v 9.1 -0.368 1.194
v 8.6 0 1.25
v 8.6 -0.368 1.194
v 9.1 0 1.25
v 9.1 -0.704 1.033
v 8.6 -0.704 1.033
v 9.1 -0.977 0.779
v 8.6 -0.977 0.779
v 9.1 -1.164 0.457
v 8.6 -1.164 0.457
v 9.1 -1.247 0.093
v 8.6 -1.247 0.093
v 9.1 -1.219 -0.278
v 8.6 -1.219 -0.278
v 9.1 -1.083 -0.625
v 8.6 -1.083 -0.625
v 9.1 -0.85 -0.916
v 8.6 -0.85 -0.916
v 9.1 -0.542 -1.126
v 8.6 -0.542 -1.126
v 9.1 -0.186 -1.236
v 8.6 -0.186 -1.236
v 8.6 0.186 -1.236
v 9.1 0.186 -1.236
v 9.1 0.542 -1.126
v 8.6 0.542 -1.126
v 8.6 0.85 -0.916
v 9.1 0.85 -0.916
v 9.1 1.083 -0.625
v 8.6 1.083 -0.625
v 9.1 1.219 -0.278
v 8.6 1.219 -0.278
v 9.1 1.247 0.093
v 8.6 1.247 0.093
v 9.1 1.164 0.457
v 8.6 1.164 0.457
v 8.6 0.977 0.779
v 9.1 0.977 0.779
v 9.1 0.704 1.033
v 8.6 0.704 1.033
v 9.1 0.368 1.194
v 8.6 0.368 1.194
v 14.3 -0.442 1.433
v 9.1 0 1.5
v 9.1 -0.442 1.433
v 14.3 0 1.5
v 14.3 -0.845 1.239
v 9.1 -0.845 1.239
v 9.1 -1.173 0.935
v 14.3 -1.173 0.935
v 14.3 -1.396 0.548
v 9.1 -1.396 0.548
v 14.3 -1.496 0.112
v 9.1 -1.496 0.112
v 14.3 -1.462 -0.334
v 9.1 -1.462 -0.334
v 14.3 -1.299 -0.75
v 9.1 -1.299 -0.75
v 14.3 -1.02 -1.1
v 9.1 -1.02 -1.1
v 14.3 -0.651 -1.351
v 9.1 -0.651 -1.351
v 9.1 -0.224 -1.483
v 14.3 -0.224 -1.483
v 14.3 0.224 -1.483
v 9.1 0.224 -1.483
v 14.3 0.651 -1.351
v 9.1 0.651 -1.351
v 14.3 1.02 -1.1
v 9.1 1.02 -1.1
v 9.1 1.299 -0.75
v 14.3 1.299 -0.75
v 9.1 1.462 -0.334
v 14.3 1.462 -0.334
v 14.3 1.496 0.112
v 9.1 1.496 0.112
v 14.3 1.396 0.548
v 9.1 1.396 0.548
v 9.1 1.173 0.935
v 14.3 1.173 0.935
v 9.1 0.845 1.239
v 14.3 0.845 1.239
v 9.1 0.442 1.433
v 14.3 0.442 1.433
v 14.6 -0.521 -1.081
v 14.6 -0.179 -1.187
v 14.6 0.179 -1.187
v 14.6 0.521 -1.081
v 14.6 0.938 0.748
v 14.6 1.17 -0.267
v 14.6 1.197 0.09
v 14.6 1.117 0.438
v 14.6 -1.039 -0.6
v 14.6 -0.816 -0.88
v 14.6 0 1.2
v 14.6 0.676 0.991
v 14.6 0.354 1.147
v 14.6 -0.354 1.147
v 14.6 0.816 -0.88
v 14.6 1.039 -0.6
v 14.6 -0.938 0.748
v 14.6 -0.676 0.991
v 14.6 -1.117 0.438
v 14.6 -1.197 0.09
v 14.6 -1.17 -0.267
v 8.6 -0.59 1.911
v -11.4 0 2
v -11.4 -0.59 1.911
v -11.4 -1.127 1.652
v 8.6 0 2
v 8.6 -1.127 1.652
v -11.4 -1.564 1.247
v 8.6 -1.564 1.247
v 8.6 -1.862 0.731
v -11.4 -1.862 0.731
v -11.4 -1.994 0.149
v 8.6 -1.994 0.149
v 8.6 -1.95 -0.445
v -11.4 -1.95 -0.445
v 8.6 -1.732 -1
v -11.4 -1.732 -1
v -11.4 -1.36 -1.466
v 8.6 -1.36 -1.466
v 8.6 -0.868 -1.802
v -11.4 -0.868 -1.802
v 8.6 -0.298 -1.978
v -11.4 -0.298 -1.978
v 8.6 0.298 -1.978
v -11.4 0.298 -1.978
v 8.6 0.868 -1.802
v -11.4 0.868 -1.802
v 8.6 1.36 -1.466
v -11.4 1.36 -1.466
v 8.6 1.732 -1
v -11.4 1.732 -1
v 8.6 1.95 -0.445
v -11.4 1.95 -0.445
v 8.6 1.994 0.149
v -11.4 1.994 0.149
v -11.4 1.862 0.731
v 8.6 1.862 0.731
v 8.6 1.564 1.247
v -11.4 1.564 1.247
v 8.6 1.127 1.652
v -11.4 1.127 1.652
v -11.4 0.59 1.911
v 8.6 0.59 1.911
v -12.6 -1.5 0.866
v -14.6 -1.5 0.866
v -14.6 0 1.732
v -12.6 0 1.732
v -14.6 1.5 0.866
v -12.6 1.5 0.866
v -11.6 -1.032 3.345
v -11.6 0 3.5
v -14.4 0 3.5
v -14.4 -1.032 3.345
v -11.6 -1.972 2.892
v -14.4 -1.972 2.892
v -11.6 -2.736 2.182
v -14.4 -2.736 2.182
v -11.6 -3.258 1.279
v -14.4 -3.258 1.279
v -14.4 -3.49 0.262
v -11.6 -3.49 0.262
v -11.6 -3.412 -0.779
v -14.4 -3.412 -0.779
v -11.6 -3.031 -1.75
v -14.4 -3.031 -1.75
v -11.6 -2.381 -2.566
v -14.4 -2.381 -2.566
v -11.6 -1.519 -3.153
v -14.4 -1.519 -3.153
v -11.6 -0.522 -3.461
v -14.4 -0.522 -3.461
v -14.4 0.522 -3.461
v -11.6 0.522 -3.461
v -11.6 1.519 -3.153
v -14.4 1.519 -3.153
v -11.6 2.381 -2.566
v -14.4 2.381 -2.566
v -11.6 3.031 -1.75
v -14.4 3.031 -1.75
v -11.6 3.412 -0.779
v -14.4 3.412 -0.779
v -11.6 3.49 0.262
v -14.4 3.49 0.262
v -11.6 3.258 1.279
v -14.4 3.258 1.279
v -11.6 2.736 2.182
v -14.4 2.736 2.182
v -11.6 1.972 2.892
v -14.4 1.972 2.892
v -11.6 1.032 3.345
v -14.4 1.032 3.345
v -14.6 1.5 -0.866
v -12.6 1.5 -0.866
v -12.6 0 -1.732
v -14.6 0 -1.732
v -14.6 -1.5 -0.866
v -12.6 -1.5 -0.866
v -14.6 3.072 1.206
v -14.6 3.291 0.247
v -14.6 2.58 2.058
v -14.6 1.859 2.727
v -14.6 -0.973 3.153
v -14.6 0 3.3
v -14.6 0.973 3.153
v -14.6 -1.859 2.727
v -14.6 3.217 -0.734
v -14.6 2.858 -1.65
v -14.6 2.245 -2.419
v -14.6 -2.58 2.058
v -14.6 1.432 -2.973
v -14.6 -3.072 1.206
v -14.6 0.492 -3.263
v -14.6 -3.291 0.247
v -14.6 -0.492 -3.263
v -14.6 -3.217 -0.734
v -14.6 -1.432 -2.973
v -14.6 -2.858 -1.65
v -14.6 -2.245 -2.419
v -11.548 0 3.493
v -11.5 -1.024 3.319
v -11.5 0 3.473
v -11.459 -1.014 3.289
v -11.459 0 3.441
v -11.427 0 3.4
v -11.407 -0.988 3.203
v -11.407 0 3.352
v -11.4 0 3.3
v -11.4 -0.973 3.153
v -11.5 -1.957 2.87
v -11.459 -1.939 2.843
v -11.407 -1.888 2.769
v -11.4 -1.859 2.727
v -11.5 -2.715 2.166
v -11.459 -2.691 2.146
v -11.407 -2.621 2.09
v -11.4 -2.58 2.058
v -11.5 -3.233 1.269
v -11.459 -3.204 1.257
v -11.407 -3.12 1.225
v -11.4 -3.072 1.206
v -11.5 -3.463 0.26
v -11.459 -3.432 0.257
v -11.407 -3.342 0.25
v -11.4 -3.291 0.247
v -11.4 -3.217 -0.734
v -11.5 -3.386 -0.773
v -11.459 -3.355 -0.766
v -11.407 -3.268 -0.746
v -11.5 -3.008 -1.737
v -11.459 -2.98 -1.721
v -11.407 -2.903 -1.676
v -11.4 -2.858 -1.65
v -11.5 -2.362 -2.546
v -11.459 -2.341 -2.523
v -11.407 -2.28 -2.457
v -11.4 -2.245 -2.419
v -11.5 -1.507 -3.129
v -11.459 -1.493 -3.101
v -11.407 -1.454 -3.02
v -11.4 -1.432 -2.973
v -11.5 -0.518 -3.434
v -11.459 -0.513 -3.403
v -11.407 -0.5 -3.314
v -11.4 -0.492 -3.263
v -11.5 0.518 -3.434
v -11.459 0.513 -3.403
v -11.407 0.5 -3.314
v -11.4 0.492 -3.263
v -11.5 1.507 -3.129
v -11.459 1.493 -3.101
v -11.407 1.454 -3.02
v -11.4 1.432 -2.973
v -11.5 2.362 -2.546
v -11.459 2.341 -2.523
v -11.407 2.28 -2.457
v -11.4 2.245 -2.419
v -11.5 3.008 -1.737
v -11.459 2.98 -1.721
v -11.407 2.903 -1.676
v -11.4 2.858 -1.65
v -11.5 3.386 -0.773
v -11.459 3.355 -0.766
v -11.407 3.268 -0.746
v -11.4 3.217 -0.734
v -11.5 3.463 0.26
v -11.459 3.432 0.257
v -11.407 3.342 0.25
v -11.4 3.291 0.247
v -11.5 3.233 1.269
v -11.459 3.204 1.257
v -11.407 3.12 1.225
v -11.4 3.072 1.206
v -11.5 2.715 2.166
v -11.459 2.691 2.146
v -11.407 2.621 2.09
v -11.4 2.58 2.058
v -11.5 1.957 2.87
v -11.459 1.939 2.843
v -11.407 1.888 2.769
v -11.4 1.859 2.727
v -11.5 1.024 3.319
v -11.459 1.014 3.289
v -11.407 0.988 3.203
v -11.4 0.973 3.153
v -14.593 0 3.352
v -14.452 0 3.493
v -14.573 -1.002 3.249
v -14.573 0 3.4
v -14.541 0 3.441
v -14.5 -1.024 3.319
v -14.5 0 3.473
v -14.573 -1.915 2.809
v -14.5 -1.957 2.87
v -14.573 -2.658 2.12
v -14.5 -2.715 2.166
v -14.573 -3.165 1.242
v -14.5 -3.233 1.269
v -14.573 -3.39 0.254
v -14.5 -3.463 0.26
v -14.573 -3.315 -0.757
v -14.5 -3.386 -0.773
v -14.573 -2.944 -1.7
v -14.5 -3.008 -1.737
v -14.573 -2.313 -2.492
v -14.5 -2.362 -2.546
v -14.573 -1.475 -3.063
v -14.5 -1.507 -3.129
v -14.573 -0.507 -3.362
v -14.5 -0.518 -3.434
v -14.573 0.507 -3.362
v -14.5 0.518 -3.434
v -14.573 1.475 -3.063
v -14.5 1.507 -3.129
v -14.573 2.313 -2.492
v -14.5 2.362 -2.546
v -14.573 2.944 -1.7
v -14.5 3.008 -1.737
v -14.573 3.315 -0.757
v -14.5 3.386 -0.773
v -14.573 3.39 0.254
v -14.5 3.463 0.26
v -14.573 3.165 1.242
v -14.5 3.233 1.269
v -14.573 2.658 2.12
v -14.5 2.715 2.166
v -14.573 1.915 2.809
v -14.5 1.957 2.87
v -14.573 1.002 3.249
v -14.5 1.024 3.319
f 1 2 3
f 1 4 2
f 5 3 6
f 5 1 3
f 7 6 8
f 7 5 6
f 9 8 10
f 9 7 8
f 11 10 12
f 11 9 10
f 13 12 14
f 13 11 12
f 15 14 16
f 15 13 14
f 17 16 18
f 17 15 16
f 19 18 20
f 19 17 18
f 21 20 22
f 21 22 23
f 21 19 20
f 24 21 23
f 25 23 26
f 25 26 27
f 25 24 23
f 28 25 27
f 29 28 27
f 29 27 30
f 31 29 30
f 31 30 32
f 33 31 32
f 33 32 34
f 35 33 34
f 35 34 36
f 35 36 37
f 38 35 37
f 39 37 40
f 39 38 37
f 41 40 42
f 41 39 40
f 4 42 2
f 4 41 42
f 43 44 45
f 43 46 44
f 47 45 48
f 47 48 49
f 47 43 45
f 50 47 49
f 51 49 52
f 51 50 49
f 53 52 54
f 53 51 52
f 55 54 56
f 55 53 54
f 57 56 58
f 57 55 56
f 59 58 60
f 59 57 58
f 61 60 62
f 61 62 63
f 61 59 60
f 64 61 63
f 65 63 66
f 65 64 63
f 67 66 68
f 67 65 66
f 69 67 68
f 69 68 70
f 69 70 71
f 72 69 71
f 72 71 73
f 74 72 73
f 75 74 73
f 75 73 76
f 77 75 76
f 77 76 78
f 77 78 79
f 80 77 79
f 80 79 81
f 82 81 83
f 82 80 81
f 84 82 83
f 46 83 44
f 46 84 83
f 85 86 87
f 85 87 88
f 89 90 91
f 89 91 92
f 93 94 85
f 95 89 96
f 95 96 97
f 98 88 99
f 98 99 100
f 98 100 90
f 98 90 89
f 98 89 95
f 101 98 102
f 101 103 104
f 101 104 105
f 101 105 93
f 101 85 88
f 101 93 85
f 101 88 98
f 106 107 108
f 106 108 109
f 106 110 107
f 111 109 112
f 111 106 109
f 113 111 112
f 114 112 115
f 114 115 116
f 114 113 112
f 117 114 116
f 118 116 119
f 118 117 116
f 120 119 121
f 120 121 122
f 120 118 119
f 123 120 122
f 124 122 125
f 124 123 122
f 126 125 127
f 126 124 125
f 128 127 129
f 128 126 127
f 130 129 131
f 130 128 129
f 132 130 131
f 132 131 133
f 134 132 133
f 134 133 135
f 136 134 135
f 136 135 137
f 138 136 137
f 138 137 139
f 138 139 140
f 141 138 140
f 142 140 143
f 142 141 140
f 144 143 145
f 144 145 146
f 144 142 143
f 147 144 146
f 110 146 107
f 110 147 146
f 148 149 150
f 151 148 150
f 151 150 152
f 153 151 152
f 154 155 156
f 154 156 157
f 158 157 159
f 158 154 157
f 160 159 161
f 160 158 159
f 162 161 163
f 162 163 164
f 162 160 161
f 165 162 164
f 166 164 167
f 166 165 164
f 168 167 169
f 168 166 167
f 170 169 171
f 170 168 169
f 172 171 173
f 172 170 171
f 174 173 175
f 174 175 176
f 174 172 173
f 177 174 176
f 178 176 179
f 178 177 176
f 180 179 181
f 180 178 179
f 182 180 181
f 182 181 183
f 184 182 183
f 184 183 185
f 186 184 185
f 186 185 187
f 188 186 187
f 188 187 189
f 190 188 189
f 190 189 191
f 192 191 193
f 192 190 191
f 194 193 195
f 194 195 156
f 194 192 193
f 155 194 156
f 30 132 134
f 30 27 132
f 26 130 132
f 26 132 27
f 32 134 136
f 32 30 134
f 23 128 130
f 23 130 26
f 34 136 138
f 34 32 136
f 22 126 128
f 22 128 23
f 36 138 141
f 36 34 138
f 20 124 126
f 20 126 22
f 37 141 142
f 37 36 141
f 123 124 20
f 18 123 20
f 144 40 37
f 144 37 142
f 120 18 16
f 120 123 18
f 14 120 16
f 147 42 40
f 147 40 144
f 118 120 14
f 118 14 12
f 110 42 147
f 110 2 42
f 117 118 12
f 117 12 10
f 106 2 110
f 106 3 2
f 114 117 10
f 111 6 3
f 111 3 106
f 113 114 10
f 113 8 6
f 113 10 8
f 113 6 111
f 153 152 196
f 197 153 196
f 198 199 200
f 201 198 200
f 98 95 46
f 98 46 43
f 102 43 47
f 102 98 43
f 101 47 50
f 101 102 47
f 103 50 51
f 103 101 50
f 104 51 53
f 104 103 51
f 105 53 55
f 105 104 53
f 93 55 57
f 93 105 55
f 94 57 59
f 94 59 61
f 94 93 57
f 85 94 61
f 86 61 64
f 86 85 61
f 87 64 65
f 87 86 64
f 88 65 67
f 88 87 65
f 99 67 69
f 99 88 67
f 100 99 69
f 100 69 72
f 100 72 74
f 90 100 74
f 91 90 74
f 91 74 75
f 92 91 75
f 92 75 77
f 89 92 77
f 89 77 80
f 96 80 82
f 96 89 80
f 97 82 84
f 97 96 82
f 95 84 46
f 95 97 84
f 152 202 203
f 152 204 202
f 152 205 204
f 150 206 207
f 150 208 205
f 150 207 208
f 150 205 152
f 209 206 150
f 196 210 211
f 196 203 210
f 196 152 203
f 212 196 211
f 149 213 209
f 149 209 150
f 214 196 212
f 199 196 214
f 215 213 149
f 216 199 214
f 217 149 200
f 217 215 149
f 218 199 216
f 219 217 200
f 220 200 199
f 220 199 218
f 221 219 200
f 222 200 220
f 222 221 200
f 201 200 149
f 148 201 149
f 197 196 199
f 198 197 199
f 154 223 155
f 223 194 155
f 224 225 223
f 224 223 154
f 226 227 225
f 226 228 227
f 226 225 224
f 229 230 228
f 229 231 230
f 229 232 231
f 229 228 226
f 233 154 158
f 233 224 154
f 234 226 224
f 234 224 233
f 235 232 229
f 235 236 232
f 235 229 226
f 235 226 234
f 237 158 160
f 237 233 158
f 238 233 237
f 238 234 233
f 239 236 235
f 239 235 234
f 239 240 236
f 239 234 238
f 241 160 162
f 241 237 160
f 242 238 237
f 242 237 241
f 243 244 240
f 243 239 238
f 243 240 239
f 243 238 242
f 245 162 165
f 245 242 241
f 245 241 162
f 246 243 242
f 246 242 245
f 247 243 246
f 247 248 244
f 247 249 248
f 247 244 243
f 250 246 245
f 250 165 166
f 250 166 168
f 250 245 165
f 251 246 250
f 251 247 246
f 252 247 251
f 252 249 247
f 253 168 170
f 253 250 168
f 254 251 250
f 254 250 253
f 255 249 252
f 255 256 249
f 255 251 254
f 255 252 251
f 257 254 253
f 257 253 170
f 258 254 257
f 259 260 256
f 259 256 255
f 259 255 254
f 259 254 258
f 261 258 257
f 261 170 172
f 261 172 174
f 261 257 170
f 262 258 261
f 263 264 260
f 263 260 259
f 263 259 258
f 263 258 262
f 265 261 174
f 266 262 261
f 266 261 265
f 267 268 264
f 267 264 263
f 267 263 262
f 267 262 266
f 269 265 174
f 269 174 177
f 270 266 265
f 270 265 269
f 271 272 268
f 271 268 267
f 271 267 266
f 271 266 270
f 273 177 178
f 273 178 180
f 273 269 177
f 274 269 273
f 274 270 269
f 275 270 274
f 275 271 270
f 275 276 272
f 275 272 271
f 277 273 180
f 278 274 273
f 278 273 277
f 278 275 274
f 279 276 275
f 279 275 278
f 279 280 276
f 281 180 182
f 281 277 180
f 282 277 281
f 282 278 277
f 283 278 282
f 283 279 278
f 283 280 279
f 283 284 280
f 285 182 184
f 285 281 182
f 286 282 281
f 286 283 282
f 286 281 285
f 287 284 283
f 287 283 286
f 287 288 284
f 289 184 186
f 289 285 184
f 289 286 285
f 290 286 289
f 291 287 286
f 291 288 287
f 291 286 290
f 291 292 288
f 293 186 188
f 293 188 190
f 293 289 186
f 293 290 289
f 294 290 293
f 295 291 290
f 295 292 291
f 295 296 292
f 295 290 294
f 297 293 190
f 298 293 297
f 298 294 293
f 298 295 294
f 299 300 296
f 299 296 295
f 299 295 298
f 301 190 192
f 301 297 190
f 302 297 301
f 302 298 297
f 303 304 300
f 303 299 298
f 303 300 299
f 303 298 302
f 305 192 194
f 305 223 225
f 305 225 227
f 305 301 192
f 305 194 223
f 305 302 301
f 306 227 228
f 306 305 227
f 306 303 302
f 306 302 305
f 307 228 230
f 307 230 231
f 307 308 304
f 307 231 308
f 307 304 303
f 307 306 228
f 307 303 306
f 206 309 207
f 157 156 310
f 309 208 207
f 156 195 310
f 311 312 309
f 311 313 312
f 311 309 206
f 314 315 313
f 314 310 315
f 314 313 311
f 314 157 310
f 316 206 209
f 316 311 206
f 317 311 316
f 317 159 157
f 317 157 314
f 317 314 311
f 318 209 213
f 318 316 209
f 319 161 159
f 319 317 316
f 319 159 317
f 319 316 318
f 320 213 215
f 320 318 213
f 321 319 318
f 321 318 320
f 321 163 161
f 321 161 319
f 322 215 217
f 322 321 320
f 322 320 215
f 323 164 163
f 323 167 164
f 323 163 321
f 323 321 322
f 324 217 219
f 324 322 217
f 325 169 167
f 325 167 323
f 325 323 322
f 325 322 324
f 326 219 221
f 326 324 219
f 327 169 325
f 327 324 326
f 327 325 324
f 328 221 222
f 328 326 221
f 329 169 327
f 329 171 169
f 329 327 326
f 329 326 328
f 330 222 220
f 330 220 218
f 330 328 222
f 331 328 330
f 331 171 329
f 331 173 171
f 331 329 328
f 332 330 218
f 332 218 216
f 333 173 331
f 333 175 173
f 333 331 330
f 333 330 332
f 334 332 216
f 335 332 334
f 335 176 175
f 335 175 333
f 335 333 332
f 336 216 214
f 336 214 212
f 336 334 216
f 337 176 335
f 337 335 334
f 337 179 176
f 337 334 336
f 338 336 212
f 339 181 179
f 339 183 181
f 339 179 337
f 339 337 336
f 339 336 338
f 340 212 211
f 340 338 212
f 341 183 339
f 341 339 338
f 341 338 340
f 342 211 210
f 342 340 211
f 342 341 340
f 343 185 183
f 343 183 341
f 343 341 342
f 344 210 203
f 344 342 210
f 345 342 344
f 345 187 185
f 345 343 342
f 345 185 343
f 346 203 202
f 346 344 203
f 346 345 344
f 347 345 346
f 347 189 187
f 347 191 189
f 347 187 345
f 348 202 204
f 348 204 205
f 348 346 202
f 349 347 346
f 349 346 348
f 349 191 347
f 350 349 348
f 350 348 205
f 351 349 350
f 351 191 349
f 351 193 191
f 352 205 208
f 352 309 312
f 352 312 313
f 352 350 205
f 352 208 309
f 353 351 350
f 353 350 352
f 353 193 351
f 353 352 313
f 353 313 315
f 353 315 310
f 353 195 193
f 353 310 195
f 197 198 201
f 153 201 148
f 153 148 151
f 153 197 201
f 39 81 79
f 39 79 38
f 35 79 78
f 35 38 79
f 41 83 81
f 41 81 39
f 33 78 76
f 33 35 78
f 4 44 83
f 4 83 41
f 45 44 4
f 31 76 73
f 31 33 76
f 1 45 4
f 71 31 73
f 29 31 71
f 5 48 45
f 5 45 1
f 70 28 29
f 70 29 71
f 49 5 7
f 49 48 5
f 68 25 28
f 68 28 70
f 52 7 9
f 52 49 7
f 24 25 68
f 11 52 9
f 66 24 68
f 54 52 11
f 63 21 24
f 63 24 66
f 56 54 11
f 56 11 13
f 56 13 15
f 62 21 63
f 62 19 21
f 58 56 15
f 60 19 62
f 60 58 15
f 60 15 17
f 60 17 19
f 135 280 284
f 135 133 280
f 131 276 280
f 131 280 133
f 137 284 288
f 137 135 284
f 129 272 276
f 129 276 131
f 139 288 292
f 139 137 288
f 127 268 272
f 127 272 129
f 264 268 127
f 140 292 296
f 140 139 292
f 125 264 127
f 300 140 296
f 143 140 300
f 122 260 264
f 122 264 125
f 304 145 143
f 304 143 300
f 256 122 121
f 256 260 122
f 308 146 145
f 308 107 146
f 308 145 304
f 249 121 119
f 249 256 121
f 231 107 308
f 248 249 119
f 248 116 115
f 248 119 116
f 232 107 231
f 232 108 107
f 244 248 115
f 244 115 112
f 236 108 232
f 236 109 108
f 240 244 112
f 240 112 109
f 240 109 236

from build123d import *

# Parameters (mm, degrees)
FILLET_1_R          = 0.2
CHAMFER_1_SIZE      = 0.3
SKETCH_3_W          = 0.5
SKETCH_3_H          = 0.25
CUT_EXTRUDE_1_DEPTH = 2


with BuildPart() as part:
    # 草图1 → 旋转1 (revolve)
    with BuildSketch(Plane.XY, mode=Mode.PRIVATE) as revolve_1_sk:
        Polygon((-14.6, 0), (-14.6, 3.5), (-11.4, 3.5), (-11.4, 2), (8.6, 2), (8.6, 1.5), (14.6, 1.5), (14.6, 0), align=None)
    revolve(revolve_1_sk.sketch.rotate(Axis((-14.6, 0, 0), (1, 0, 0)), 90), axis=Axis((-14.6, 0, 0), (1, 0, 0)))

    # 圆角1
    fillet_1_edges = [part.edges().sort_by_distance(p)[0] for p in [
        (-11.4, 0, -3.5),
        (-14.6, 0, -3.5),
    ]]
    fillet(fillet_1_edges, radius=FILLET_1_R)

    # 倒角1
    chamfer_1_edges = [part.edges().sort_by_distance(p)[0] for p in [
        (14.6, 0, -1.5),
    ]]
    chamfer(chamfer_1_edges, length=CHAMFER_1_SIZE)

    # 草图3 → 切除-旋转1 (revolve, cut)
    with BuildSketch(Plane.XY, mode=Mode.PRIVATE) as cut_revolve_1_sk:
        with Locations((8.85, 1.375)):
            Rectangle(SKETCH_3_W, SKETCH_3_H)
    revolve(cut_revolve_1_sk.sketch.rotate(Axis((8.6, 0, 0), (1, 0, 0)), 90), axis=Axis((8.6, 0, 0), (1, 0, 0)), mode=Mode.SUBTRACT)

    # 草图4 → 切除-拉伸1 (cut)
    with BuildSketch(Plane.ZY.offset(14.6)):
        Polygon((1.732050808, 0), (0.866025404, 1.5), (-0.866025404, 1.5), (-1.732050808, 0), (-0.866025404, -1.5), (0.866025404, -1.5), align=None)
    extrude(amount=-CUT_EXTRUDE_1_DEPTH, mode=Mode.SUBTRACT)


solid = part.part
